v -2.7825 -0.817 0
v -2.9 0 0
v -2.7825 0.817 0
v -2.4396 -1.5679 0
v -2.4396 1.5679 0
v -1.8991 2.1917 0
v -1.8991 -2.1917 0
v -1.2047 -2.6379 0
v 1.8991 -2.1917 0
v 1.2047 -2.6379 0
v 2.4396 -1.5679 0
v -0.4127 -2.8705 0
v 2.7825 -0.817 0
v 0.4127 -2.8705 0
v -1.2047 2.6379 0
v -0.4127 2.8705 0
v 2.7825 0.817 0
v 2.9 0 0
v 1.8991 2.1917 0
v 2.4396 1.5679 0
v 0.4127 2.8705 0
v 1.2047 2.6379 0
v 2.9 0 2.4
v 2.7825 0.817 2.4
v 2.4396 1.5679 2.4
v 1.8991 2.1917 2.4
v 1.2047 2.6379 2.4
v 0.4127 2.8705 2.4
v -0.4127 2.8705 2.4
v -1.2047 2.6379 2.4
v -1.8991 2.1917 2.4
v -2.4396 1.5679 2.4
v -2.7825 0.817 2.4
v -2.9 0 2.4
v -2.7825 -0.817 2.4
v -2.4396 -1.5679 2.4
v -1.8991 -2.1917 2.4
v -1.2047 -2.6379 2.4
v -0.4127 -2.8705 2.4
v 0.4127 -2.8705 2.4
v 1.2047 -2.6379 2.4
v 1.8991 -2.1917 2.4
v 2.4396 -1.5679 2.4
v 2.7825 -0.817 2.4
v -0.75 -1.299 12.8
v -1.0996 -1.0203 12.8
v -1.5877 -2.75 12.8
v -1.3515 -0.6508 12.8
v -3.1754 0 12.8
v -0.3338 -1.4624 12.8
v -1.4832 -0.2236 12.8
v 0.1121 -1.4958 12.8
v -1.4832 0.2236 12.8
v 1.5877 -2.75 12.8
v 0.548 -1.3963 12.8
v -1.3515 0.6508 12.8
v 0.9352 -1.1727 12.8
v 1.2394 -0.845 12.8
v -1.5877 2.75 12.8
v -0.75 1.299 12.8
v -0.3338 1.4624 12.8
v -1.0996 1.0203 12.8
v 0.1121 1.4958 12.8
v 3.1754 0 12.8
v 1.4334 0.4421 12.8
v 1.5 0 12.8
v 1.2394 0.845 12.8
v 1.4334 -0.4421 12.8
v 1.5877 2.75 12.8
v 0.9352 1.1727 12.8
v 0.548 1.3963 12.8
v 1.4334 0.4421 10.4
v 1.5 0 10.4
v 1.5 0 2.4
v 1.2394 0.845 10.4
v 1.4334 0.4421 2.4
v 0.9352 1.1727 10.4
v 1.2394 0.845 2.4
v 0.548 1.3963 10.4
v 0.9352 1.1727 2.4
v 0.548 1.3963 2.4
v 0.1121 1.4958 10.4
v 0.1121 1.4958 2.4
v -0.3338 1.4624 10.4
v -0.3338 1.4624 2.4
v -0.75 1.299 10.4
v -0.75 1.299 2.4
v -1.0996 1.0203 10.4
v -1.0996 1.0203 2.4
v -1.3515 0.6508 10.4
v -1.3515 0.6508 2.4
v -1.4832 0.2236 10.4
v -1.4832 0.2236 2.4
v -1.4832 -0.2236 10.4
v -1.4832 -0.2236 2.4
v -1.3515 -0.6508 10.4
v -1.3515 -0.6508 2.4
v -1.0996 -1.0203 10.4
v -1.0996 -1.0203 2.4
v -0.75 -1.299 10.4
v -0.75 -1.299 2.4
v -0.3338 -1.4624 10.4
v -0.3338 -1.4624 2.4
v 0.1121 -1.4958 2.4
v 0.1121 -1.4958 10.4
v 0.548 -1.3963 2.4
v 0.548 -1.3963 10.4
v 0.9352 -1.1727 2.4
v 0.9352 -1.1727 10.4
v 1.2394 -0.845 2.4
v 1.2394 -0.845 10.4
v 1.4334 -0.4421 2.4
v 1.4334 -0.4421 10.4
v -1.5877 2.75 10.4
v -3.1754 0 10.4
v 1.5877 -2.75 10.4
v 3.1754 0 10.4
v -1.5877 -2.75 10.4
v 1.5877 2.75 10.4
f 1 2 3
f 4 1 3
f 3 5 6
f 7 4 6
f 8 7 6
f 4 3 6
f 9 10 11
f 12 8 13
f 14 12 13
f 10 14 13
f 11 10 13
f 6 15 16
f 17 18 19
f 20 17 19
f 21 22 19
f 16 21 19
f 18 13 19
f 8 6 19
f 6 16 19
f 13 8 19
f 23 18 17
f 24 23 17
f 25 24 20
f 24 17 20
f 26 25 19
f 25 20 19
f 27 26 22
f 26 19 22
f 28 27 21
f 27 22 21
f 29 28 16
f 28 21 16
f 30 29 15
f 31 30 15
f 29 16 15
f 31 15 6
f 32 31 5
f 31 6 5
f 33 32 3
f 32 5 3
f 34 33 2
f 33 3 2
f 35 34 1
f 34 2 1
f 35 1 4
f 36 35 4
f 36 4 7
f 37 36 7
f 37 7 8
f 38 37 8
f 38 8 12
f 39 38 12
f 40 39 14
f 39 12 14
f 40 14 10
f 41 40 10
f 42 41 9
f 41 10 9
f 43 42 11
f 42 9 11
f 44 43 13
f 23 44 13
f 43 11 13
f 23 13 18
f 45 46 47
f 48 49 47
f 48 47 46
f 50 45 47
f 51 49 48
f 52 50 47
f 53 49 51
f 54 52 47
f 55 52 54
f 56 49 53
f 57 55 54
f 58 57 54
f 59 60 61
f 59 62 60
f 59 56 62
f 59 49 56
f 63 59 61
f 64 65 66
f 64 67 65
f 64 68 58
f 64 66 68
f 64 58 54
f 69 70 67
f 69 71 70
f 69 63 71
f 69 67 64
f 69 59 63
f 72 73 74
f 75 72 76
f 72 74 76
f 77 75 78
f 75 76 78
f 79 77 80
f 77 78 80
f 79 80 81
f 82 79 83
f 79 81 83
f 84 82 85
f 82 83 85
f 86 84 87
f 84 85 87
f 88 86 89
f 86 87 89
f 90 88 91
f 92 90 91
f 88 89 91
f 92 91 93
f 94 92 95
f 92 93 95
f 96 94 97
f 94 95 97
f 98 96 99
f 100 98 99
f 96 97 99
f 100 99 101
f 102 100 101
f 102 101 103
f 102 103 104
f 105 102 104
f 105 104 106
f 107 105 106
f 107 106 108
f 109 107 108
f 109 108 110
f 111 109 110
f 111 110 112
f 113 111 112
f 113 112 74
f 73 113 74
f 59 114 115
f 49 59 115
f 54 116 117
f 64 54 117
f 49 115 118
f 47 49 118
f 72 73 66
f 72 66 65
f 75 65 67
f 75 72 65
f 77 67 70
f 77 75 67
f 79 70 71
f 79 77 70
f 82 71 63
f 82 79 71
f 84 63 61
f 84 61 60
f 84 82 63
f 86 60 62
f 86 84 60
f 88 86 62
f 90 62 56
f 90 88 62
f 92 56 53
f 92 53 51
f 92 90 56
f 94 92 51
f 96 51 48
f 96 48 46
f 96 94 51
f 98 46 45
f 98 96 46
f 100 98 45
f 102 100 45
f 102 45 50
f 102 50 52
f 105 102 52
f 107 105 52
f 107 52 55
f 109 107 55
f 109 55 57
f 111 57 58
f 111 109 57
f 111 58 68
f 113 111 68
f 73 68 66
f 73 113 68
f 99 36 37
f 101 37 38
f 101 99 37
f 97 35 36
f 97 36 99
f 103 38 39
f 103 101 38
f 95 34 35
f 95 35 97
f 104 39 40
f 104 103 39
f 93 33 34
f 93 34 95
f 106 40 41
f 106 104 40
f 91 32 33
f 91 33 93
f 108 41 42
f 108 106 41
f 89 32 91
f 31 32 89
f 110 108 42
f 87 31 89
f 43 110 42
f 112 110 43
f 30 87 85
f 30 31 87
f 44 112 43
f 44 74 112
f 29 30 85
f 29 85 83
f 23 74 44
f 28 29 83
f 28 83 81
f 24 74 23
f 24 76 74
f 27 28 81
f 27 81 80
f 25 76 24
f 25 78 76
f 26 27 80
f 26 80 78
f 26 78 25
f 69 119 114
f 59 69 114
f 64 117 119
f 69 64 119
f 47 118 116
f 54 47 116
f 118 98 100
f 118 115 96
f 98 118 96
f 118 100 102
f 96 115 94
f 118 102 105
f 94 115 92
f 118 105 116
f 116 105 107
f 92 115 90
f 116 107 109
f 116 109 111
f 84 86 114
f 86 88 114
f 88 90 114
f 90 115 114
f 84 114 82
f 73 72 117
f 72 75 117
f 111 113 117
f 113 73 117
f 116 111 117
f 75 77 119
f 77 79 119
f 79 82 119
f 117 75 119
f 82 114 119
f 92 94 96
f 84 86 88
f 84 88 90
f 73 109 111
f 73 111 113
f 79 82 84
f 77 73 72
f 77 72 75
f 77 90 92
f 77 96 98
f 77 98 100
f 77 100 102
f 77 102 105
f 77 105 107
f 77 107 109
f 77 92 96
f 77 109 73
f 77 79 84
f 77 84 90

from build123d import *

# Parameters (mm, degrees)
F0_R     = 1.5
F1_DEPTH = 10.4
F0_R_2   = 2.9
F2_DEPTH = 2.4
F3_R     = 1.5
F4_DEPTH = 2.4


with BuildPart() as f1:
    # F0 (on Top) → F1 (new body)
    with BuildSketch(Plane.XY):
        Circle(F0_R)
    extrude(amount=F1_DEPTH)

    # F0 (on Top) → F2 (join)
    with BuildSketch(Plane.XY):
        Circle(F0_R_2)
        Circle(F0_R, mode=Mode.SUBTRACT)
    extrude(amount=F2_DEPTH)


with BuildPart() as f4:
    # F3 (on face) → F4 (new body)
    with BuildSketch(Plane.XY.offset(10.4)):
        Polygon((3.175426, 0), (1.587713, 2.75), (-1.587713, 2.75), (-3.175426, 0), (-1.587713, -2.75), (1.587713, -2.75), align=None)
        Circle(F3_R, mode=Mode.SUBTRACT)
    extrude(amount=F4_DEPTH)


solid = Compound([f1.part, f4.part])
